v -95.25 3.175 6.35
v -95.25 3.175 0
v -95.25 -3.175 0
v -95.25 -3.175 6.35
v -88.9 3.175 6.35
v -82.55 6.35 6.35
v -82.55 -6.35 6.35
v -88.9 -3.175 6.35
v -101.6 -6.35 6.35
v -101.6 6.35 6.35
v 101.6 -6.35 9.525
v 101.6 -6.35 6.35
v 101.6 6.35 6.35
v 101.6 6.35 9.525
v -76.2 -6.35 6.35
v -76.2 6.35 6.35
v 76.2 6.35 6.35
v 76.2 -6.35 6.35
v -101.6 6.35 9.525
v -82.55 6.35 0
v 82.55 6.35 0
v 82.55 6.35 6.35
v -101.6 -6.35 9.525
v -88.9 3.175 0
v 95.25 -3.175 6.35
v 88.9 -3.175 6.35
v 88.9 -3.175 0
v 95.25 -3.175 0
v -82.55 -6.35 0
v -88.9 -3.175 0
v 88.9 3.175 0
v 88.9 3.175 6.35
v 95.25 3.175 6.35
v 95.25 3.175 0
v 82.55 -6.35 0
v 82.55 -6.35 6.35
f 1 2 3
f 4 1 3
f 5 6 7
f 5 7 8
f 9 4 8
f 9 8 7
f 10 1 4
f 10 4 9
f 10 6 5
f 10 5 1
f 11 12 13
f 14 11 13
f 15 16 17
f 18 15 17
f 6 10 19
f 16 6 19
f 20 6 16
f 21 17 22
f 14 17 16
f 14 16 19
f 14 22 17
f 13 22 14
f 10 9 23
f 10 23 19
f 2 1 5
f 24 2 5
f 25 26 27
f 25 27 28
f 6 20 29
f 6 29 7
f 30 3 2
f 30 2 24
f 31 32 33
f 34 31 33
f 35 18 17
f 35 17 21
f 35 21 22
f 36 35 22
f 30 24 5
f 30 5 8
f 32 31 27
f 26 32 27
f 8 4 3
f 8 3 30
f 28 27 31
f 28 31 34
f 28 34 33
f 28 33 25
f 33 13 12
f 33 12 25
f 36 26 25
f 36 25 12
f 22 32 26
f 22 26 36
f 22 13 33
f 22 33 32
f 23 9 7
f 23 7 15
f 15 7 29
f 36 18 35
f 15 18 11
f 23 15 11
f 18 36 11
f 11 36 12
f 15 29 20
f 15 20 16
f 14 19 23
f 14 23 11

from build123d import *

# Parameters (mm, degrees)
F0_W     = 203.2
F0_H     = 12.7
F1_DEPTH = 9.525
F2_W     = 19.05
F2_H     = 6.35
F3_DEPTH = 25.4
F4_W     = 6.35
F4_H     = 6.35
F5_DEPTH = 6.35
F7_DEPTH = 25.4


with BuildPart() as f1:
    # F0 (on Top) → F1 (new body)
    with BuildSketch(Plane.XY):
        Rectangle(F0_W, F0_H)
    extrude(amount=F1_DEPTH)

    # F2 (on face) → F3 (cut)
    with BuildSketch(Plane(origin=(0, 6.35, 0), x_dir=(-1, 0, 0), z_dir=(0, 1, 0))):
        with Locations((-92.075, 3.175)):
            Rectangle(F2_W, F2_H)
        with Locations((92.075, 3.175)):
            Rectangle(F2_W, F2_H)
    extrude(amount=-F3_DEPTH, mode=Mode.SUBTRACT)

    # F4 (on face) → F5 (join, through all)
    with BuildSketch(Plane(origin=(0, 0, 0), x_dir=(1, 0, 0), z_dir=(0, 0, -1))):
        with Locations((-92.075, 0)):
            Rectangle(F4_W, F4_H)
        with Locations((92.075, 0)):
            Rectangle(F4_W, F4_H)
    extrude(amount=-F5_DEPTH)

    # F6 (on face) → F7 (cut)
    with BuildSketch(Plane(origin=(0, 6.35, 0), x_dir=(-1, 0, 0), z_dir=(0, 1, 0))):
        Polygon((-82.55, 0), (82.55, 0), (76.2, 6.35), (-76.2, 6.35), align=None)
    extrude(amount=-F7_DEPTH, mode=Mode.SUBTRACT)


solid = f1.part
